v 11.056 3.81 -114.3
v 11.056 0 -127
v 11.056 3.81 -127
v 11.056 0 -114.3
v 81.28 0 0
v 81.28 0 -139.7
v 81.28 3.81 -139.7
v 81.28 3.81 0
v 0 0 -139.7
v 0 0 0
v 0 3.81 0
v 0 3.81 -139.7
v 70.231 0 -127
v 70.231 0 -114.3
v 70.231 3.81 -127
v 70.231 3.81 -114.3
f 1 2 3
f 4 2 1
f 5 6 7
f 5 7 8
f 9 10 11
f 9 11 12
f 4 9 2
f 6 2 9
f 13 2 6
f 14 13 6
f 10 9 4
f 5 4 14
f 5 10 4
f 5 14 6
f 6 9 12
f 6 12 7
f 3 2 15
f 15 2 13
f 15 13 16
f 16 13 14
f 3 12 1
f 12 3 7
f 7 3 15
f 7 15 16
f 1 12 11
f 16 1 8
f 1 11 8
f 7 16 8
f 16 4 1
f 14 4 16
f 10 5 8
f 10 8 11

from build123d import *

# Parameters (mm, degrees)
F0_W     = 59.175328
F0_H     = 12.7
F1_DEPTH = 3.81


with BuildPart() as f1:
    # F0 (on Front) → F1 (new body)
    with BuildSketch(Plane.XZ):
        Polygon((81.28, 0), (0, 0), (0, -114.3), (0, -127), (0, -139.7), (81.28, -139.7), (81.28, -127), (81.28, -114.3), align=None)
        with Locations((40.643336, -120.65)):
            Rectangle(F0_W, F0_H, mode=Mode.SUBTRACT)
    extrude(amount=-F1_DEPTH)


solid = f1.part
